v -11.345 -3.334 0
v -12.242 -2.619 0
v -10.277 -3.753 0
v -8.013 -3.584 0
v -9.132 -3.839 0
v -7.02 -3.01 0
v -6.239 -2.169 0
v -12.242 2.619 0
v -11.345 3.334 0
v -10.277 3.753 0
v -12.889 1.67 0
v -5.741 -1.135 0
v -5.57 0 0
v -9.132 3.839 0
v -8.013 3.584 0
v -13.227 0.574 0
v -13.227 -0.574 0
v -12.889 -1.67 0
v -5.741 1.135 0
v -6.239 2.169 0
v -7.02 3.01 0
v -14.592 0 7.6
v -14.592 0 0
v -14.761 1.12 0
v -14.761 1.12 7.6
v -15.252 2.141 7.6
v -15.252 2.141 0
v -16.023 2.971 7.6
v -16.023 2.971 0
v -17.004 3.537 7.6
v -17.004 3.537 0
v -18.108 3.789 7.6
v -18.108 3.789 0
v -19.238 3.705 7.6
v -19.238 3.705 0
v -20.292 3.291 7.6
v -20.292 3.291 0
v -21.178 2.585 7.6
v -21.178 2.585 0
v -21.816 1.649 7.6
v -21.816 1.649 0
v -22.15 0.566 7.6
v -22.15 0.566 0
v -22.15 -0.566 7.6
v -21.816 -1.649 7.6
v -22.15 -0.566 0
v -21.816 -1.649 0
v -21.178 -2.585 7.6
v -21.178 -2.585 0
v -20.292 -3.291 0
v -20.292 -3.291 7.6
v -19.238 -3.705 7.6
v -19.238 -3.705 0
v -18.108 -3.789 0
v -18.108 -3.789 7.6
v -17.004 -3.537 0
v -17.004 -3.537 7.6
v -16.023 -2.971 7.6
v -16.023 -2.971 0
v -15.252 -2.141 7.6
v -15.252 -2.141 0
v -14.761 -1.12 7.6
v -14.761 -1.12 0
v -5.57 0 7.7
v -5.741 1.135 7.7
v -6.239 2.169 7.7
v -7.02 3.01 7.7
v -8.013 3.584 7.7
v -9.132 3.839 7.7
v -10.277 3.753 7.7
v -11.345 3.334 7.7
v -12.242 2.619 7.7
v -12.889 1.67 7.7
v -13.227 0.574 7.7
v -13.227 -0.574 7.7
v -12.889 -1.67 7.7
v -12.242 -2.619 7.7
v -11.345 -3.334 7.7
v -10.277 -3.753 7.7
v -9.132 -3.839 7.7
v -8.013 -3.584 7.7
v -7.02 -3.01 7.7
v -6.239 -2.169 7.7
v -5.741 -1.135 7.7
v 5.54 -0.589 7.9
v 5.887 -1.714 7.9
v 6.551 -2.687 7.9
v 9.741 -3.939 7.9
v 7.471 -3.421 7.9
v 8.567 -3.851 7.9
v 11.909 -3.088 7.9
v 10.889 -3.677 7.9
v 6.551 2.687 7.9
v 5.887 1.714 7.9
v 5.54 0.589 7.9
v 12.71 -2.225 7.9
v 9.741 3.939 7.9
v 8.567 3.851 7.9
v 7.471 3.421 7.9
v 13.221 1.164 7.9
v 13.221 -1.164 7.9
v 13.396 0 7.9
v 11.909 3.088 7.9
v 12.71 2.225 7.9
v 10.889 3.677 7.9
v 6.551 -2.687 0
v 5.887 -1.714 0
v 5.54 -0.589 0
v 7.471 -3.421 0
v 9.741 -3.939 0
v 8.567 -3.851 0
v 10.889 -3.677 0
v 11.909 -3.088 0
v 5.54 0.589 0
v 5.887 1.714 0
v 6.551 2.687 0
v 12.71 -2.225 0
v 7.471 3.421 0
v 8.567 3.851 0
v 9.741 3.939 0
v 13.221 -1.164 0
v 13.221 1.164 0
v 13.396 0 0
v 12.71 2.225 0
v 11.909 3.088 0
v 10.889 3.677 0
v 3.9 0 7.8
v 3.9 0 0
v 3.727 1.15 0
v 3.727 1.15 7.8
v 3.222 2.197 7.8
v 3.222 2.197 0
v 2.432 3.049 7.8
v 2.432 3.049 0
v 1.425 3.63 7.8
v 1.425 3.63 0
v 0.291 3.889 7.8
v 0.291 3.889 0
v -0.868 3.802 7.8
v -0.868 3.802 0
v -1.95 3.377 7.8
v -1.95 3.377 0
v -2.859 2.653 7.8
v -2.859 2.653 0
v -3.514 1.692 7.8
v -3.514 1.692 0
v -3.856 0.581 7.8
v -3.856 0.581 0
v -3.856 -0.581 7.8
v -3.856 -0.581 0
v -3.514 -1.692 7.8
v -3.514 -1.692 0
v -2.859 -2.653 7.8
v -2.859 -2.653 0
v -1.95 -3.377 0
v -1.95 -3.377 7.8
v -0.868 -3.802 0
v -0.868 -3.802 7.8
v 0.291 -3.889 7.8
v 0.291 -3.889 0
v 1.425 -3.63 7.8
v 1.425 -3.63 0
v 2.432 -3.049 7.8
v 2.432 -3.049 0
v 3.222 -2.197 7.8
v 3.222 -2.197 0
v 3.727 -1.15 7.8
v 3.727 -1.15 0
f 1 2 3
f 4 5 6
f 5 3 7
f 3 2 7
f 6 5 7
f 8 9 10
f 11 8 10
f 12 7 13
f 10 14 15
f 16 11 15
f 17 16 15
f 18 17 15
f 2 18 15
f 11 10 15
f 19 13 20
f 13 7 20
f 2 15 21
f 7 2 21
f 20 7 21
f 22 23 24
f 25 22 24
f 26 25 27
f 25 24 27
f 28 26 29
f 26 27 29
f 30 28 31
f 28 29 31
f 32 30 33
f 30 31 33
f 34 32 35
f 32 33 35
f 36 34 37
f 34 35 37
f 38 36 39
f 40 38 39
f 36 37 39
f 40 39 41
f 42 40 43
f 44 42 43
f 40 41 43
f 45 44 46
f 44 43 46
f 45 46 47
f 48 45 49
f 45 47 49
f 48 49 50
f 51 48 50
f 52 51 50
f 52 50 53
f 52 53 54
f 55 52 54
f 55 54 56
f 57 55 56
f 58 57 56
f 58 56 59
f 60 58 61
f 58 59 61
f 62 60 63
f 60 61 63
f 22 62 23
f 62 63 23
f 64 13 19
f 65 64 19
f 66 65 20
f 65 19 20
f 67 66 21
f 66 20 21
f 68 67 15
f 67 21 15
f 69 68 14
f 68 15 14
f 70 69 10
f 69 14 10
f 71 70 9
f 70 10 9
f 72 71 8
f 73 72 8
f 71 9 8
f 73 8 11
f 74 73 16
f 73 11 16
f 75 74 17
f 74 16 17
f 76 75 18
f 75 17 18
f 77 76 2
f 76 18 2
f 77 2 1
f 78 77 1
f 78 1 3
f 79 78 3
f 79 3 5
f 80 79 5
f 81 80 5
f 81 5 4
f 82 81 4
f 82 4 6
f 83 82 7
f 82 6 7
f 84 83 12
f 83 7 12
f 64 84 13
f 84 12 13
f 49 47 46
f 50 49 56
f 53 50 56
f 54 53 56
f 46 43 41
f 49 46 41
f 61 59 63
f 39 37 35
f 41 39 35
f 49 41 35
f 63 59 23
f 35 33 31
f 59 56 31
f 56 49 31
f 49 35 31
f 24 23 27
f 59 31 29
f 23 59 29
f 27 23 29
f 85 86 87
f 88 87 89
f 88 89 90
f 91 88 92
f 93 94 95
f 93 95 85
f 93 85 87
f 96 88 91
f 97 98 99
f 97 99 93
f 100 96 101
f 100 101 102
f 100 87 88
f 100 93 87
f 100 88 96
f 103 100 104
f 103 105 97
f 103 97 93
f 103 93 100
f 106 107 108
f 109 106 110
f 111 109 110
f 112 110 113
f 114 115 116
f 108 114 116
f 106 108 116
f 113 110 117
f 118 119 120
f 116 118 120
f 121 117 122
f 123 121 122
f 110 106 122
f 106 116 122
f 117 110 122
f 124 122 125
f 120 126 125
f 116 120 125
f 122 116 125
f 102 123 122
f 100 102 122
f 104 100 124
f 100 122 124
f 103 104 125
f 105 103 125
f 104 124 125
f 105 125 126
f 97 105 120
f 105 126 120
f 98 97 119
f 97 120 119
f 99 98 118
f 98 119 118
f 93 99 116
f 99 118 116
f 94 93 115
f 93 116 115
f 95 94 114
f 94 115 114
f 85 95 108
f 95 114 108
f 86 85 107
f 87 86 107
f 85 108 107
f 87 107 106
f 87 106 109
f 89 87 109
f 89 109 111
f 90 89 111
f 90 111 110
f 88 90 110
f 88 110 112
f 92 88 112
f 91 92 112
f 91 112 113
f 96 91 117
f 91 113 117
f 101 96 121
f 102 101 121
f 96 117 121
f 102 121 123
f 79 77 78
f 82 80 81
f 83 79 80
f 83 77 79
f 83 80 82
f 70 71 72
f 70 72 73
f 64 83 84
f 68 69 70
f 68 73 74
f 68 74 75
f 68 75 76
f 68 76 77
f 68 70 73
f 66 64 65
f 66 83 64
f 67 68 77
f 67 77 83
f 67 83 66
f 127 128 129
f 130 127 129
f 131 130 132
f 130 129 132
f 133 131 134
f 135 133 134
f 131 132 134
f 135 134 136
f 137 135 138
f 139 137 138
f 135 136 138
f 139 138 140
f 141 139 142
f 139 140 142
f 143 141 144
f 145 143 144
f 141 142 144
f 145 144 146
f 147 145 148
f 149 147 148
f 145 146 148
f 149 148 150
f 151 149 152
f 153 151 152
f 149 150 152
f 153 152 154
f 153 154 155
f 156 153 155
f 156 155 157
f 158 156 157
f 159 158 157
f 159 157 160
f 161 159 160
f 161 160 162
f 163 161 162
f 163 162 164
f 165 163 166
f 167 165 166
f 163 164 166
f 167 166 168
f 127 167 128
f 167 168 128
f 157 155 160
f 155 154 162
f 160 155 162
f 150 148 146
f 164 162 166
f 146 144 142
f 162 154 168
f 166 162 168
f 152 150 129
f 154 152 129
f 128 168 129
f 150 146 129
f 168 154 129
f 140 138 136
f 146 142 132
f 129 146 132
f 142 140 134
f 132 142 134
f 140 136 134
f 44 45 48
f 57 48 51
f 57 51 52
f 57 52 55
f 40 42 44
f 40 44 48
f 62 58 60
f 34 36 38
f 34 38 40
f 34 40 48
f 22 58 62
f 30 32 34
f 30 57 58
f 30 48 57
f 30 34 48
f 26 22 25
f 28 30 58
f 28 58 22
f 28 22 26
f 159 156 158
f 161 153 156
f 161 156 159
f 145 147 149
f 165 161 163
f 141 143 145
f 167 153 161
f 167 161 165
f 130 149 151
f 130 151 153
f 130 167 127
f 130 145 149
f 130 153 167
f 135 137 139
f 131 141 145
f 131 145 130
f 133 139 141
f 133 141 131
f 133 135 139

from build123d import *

# Parameters (mm, degrees)
F0_R     = 3.95
F1_DEPTH = 7.9
F0_R_2   = 3.9
F2_DEPTH = 7.8
F0_R_3   = 3.85
F3_DEPTH = 7.7
F0_R_4   = 3.8
F4_DEPTH = 7.6


with BuildPart() as f1:
    # F0 (on Top) → F1 (new body)
    with BuildSketch(Plane.XY):
        with Locations((9.446191, 0)):
            Circle(F0_R)
    extrude(amount=F1_DEPTH)


with BuildPart() as f2:
    # F0 (on Top) → F2 (new body)
    with BuildSketch(Plane.XY):
        Circle(F0_R_2)
    extrude(amount=F2_DEPTH)


with BuildPart() as f3:
    # F0 (on Top) → F3 (new body)
    with BuildSketch(Plane.XY):
        with Locations((-9.420032, 0)):
            Circle(F0_R_3)
    extrude(amount=F3_DEPTH)


with BuildPart() as f4:
    # F0 (on Top) → F4 (new body)
    with BuildSketch(Plane.XY):
        with Locations((-18.392134, 0)):
            Circle(F0_R_4)
    extrude(amount=F4_DEPTH)


solid = Compound([f1.part, f2.part, f3.part, f4.part])
